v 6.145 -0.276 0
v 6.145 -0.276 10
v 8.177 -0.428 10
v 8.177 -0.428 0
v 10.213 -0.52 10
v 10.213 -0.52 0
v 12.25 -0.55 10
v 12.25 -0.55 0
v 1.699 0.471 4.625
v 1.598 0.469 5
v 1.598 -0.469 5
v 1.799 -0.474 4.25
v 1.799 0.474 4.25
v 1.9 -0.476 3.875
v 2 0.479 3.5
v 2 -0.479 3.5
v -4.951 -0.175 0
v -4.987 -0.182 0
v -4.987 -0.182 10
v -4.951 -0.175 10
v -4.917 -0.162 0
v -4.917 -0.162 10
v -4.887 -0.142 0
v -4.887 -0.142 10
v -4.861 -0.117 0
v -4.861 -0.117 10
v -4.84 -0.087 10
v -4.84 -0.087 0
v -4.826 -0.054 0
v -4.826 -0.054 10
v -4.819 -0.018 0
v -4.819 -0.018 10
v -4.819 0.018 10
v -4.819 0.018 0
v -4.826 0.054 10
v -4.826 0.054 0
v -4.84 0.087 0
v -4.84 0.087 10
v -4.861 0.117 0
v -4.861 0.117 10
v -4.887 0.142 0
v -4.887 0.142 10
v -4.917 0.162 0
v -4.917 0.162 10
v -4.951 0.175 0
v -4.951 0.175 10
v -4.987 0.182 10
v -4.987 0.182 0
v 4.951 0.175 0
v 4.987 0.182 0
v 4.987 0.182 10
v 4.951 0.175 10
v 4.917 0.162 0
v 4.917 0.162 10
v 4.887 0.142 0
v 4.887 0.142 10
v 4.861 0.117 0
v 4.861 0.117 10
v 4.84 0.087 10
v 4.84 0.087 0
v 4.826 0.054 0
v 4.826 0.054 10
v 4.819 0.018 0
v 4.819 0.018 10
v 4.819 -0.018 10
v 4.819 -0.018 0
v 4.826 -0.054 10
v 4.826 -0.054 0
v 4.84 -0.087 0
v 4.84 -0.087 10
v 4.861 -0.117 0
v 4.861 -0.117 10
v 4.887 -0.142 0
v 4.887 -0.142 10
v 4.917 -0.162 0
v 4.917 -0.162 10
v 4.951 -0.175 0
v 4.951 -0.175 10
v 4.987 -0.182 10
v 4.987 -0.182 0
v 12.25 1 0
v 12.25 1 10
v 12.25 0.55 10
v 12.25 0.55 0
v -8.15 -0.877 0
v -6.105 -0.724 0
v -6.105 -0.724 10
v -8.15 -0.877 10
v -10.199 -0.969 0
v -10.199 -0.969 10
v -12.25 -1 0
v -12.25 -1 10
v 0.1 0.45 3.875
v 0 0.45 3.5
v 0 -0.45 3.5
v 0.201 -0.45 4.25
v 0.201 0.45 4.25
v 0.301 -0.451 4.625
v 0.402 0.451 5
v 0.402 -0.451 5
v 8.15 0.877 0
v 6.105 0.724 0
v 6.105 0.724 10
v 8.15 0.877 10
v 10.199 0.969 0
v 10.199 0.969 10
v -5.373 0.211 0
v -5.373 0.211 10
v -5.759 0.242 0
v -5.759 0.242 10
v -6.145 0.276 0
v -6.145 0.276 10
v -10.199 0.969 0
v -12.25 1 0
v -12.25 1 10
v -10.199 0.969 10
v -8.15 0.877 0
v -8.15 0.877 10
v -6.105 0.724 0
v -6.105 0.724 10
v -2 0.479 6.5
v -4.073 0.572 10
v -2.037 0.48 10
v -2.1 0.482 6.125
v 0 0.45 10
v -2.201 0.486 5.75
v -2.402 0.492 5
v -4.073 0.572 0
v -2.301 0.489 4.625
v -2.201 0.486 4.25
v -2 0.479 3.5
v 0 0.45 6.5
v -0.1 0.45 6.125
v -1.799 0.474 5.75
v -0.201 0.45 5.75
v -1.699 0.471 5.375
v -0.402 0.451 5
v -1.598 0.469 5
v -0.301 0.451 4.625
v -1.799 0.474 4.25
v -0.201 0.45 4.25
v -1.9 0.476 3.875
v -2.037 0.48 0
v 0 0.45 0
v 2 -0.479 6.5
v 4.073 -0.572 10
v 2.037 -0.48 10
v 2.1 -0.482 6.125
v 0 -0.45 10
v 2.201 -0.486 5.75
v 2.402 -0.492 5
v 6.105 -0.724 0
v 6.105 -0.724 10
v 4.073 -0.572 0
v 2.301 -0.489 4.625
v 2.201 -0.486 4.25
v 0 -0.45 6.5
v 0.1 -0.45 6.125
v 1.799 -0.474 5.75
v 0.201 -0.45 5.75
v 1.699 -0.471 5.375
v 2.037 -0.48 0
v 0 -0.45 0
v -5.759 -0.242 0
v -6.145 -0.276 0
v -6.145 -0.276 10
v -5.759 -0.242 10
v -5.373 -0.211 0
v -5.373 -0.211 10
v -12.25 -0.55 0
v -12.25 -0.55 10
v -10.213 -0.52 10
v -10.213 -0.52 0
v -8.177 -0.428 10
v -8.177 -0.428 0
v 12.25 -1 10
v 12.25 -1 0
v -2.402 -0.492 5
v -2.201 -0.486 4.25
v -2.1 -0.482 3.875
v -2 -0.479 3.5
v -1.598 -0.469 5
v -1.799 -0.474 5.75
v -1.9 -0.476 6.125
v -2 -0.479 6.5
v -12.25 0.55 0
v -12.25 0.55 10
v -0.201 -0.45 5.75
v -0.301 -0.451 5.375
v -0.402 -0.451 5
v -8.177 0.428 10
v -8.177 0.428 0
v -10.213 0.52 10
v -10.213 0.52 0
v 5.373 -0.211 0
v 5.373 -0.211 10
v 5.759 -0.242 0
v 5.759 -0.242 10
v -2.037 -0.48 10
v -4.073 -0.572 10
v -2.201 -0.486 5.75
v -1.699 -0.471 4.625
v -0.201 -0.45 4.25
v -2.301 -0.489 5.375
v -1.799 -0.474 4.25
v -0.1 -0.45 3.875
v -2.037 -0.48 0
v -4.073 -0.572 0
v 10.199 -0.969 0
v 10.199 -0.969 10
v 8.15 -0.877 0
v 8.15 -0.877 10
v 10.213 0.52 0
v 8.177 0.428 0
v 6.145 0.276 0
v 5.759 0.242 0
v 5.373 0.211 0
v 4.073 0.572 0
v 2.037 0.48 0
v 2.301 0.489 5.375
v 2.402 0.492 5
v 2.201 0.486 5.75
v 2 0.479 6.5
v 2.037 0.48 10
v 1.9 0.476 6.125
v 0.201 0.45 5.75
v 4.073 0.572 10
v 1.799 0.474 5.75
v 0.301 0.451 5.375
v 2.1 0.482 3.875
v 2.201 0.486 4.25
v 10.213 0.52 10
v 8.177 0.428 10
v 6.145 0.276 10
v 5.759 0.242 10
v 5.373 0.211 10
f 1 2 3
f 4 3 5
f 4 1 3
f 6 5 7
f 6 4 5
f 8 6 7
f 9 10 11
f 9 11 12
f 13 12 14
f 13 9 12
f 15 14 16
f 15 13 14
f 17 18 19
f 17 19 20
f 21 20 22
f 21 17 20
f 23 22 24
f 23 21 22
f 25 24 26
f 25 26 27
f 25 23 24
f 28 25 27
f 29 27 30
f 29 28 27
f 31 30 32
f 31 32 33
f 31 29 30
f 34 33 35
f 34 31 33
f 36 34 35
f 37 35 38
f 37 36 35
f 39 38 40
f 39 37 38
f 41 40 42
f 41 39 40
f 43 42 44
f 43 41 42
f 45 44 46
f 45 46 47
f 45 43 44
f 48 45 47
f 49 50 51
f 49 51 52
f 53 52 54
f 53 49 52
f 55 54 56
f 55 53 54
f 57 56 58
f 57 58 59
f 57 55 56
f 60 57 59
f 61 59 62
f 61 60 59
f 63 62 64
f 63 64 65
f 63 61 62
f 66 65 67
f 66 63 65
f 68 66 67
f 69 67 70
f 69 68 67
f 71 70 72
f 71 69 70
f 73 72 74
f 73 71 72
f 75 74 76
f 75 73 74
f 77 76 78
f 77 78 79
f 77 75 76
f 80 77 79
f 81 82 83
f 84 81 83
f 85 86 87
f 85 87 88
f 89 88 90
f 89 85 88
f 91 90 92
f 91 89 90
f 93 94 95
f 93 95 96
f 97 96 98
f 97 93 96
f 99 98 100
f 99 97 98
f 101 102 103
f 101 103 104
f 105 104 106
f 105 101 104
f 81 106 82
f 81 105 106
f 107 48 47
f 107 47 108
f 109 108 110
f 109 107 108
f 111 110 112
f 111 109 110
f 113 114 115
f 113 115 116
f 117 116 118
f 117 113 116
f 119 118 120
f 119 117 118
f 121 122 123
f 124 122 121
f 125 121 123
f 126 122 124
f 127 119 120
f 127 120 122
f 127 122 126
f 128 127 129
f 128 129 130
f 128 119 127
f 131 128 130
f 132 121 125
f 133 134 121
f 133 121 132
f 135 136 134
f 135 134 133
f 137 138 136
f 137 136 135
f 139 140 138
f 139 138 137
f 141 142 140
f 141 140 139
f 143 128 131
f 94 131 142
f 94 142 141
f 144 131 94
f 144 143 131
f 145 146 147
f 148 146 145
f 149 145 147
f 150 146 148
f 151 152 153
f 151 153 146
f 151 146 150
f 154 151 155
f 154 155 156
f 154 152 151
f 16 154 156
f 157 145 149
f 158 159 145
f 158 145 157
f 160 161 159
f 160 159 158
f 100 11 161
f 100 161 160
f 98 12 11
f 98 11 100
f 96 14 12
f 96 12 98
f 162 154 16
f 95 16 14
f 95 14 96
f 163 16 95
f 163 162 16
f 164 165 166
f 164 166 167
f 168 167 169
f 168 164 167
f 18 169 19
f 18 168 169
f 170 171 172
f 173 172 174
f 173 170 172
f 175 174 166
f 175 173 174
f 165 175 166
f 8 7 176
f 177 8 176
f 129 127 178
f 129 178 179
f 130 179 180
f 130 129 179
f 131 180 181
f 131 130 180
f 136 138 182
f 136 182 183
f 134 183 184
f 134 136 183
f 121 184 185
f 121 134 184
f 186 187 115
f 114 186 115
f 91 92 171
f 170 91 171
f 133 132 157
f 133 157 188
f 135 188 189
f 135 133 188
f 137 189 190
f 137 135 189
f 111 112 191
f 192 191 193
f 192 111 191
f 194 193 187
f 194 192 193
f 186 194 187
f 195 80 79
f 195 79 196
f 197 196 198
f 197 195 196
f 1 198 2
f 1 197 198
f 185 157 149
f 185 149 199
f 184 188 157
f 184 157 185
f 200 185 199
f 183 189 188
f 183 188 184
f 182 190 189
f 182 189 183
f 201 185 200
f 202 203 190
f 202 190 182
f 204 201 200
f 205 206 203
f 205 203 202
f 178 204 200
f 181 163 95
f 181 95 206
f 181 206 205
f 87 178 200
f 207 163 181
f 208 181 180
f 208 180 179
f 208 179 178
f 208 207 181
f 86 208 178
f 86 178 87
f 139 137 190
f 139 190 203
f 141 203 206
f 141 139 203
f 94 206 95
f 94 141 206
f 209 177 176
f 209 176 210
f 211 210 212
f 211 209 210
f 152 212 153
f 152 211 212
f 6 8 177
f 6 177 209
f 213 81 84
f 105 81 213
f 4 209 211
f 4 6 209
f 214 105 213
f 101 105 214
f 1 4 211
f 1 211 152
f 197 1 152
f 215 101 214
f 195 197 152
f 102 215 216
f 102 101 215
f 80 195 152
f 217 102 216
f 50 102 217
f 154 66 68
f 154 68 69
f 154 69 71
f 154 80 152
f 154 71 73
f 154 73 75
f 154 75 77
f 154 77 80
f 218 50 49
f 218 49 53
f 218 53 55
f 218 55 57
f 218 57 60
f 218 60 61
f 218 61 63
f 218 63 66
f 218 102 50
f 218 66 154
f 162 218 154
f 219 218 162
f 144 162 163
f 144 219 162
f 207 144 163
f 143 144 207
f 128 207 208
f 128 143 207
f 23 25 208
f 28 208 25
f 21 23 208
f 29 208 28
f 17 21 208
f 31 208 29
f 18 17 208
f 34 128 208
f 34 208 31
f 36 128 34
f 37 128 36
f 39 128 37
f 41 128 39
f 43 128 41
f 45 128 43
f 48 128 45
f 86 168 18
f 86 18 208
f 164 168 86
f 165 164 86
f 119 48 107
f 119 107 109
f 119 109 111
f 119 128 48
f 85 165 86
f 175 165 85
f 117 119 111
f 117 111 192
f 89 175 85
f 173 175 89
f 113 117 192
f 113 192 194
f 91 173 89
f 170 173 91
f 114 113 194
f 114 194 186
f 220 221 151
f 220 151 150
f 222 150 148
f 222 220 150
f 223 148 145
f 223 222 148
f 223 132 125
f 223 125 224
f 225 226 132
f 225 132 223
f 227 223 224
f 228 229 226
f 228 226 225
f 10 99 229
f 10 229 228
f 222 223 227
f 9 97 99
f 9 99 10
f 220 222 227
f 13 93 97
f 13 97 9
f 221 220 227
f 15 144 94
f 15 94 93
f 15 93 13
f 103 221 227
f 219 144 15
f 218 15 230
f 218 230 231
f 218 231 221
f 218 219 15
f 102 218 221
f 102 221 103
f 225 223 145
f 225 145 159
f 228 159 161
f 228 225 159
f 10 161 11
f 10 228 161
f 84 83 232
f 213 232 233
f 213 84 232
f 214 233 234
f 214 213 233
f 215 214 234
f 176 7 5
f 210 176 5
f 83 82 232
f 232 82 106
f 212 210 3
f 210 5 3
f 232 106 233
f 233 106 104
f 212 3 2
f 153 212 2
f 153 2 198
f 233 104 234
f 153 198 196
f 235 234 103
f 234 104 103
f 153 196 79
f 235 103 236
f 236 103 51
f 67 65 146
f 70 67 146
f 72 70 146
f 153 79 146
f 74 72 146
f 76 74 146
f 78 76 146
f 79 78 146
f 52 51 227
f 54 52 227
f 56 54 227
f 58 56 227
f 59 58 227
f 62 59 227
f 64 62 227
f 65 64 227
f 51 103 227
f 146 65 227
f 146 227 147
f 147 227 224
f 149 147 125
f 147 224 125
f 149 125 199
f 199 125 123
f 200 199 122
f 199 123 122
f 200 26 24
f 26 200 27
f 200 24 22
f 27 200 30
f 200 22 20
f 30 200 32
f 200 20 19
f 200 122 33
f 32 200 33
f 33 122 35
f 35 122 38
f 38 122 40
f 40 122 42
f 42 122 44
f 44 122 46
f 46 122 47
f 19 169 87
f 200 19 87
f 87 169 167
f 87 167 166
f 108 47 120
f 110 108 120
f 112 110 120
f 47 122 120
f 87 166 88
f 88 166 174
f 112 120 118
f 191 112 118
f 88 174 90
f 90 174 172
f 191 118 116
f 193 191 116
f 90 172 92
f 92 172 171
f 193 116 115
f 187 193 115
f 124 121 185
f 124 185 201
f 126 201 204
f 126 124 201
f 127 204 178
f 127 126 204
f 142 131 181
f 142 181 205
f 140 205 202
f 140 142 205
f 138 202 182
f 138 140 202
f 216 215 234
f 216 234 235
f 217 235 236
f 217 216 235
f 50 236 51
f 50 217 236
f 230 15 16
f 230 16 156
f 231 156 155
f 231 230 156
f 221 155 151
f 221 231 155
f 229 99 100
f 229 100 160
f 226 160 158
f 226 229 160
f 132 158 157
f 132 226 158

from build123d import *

# Parameters (mm, degrees)
BOSS_EXTRUDE1_DEPTH = 10
CUT_EXTRUDE1_DEPTH  = 2
LPATTERN1_COUNT     = 3
LPATTERN1_PITCH     = 2


with BuildPart() as part:
    # Sketch2 → Boss-Extrude1 (new body)
    with BuildSketch(Plane.XY):
        with BuildLine():
            Line((12.25, 1), (12.25, 0.55))
            ThreePointArc((12.25, 0.55), (9.194506694, 0.481441826), (6.145163436, 0.275905297))
            ThreePointArc((6.145163436, 0.275905297), (5.566162178, 0.226280663), (4.986761169, 0.181564549))
            ThreePointArc((4.986761169, 0.181564549), (4.817953434, 0), (4.986761169, -0.181564549))
            ThreePointArc((4.986761169, -0.181564549), (5.566162178, -0.226280663), (6.145163436, -0.275905297))
            ThreePointArc((6.145163436, -0.275905297), (9.194506694, -0.481441826), (12.25, -0.55))
            Line((12.25, -0.55), (12.25, -1))
            ThreePointArc((12.25, -1), (9.174322945, -0.93098895), (6.104836564, -0.724094703))
            ThreePointArc((6.104836564, -0.724094703), (3.055493306, -0.518558174), (0, -0.45))
            ThreePointArc((0, -0.45), (-3.055493306, -0.518558174), (-6.104836564, -0.724094703))
            ThreePointArc((-6.104836564, -0.724094703), (-9.174322945, -0.93098895), (-12.25, -1))
            Line((-12.25, -1), (-12.25, -0.55))
            ThreePointArc((-12.25, -0.55), (-9.194506694, -0.481441826), (-6.145163436, -0.275905297))
            ThreePointArc((-6.145163436, -0.275905297), (-5.566162178, -0.226280663), (-4.986761169, -0.181564549))
            ThreePointArc((-4.986761169, -0.181564549), (-4.817953434, 0), (-4.986761169, 0.181564549))
            ThreePointArc((-4.986761169, 0.181564549), (-5.566162178, 0.226280663), (-6.145163436, 0.275905297))
            ThreePointArc((-6.145163436, 0.275905297), (-9.194506694, 0.481441826), (-12.25, 0.55))
            Line((-12.25, 0.55), (-12.25, 1))
            ThreePointArc((-12.25, 1), (-9.174322945, 0.93098895), (-6.104836564, 0.724094703))
            ThreePointArc((-6.104836564, 0.724094703), (-3.055493306, 0.518558174), (0, 0.45))
            ThreePointArc((0, 0.45), (3.055493306, 0.518558174), (6.104836564, 0.724094703))
            ThreePointArc((6.104836564, 0.724094703), (9.174322945, 0.93098895), (12.25, 1))
        make_face()
    extrude(amount=BOSS_EXTRUDE1_DEPTH)

    # Sketch3 → Cut-Extrude1 (cut, symmetric)
    with BuildSketch(Plane(origin=(0, 0, 0), x_dir=(1, 0, 0), z_dir=(0, 1, 0))):
        Polygon((-2, -3.5), (-1.598076211, -5), (-2, -6.5), (-2.401923789, -5), align=None)
    cut_extrude1 = extrude(amount=CUT_EXTRUDE1_DEPTH, both=True, mode=Mode.SUBTRACT)

    # LPattern1: Cut-Extrude1 ×3
    with Locations(*[(i * LPATTERN1_PITCH, 0, 0) for i in range(1, LPATTERN1_COUNT)]):
        add(cut_extrude1, mode=Mode.SUBTRACT)


solid = part.part
